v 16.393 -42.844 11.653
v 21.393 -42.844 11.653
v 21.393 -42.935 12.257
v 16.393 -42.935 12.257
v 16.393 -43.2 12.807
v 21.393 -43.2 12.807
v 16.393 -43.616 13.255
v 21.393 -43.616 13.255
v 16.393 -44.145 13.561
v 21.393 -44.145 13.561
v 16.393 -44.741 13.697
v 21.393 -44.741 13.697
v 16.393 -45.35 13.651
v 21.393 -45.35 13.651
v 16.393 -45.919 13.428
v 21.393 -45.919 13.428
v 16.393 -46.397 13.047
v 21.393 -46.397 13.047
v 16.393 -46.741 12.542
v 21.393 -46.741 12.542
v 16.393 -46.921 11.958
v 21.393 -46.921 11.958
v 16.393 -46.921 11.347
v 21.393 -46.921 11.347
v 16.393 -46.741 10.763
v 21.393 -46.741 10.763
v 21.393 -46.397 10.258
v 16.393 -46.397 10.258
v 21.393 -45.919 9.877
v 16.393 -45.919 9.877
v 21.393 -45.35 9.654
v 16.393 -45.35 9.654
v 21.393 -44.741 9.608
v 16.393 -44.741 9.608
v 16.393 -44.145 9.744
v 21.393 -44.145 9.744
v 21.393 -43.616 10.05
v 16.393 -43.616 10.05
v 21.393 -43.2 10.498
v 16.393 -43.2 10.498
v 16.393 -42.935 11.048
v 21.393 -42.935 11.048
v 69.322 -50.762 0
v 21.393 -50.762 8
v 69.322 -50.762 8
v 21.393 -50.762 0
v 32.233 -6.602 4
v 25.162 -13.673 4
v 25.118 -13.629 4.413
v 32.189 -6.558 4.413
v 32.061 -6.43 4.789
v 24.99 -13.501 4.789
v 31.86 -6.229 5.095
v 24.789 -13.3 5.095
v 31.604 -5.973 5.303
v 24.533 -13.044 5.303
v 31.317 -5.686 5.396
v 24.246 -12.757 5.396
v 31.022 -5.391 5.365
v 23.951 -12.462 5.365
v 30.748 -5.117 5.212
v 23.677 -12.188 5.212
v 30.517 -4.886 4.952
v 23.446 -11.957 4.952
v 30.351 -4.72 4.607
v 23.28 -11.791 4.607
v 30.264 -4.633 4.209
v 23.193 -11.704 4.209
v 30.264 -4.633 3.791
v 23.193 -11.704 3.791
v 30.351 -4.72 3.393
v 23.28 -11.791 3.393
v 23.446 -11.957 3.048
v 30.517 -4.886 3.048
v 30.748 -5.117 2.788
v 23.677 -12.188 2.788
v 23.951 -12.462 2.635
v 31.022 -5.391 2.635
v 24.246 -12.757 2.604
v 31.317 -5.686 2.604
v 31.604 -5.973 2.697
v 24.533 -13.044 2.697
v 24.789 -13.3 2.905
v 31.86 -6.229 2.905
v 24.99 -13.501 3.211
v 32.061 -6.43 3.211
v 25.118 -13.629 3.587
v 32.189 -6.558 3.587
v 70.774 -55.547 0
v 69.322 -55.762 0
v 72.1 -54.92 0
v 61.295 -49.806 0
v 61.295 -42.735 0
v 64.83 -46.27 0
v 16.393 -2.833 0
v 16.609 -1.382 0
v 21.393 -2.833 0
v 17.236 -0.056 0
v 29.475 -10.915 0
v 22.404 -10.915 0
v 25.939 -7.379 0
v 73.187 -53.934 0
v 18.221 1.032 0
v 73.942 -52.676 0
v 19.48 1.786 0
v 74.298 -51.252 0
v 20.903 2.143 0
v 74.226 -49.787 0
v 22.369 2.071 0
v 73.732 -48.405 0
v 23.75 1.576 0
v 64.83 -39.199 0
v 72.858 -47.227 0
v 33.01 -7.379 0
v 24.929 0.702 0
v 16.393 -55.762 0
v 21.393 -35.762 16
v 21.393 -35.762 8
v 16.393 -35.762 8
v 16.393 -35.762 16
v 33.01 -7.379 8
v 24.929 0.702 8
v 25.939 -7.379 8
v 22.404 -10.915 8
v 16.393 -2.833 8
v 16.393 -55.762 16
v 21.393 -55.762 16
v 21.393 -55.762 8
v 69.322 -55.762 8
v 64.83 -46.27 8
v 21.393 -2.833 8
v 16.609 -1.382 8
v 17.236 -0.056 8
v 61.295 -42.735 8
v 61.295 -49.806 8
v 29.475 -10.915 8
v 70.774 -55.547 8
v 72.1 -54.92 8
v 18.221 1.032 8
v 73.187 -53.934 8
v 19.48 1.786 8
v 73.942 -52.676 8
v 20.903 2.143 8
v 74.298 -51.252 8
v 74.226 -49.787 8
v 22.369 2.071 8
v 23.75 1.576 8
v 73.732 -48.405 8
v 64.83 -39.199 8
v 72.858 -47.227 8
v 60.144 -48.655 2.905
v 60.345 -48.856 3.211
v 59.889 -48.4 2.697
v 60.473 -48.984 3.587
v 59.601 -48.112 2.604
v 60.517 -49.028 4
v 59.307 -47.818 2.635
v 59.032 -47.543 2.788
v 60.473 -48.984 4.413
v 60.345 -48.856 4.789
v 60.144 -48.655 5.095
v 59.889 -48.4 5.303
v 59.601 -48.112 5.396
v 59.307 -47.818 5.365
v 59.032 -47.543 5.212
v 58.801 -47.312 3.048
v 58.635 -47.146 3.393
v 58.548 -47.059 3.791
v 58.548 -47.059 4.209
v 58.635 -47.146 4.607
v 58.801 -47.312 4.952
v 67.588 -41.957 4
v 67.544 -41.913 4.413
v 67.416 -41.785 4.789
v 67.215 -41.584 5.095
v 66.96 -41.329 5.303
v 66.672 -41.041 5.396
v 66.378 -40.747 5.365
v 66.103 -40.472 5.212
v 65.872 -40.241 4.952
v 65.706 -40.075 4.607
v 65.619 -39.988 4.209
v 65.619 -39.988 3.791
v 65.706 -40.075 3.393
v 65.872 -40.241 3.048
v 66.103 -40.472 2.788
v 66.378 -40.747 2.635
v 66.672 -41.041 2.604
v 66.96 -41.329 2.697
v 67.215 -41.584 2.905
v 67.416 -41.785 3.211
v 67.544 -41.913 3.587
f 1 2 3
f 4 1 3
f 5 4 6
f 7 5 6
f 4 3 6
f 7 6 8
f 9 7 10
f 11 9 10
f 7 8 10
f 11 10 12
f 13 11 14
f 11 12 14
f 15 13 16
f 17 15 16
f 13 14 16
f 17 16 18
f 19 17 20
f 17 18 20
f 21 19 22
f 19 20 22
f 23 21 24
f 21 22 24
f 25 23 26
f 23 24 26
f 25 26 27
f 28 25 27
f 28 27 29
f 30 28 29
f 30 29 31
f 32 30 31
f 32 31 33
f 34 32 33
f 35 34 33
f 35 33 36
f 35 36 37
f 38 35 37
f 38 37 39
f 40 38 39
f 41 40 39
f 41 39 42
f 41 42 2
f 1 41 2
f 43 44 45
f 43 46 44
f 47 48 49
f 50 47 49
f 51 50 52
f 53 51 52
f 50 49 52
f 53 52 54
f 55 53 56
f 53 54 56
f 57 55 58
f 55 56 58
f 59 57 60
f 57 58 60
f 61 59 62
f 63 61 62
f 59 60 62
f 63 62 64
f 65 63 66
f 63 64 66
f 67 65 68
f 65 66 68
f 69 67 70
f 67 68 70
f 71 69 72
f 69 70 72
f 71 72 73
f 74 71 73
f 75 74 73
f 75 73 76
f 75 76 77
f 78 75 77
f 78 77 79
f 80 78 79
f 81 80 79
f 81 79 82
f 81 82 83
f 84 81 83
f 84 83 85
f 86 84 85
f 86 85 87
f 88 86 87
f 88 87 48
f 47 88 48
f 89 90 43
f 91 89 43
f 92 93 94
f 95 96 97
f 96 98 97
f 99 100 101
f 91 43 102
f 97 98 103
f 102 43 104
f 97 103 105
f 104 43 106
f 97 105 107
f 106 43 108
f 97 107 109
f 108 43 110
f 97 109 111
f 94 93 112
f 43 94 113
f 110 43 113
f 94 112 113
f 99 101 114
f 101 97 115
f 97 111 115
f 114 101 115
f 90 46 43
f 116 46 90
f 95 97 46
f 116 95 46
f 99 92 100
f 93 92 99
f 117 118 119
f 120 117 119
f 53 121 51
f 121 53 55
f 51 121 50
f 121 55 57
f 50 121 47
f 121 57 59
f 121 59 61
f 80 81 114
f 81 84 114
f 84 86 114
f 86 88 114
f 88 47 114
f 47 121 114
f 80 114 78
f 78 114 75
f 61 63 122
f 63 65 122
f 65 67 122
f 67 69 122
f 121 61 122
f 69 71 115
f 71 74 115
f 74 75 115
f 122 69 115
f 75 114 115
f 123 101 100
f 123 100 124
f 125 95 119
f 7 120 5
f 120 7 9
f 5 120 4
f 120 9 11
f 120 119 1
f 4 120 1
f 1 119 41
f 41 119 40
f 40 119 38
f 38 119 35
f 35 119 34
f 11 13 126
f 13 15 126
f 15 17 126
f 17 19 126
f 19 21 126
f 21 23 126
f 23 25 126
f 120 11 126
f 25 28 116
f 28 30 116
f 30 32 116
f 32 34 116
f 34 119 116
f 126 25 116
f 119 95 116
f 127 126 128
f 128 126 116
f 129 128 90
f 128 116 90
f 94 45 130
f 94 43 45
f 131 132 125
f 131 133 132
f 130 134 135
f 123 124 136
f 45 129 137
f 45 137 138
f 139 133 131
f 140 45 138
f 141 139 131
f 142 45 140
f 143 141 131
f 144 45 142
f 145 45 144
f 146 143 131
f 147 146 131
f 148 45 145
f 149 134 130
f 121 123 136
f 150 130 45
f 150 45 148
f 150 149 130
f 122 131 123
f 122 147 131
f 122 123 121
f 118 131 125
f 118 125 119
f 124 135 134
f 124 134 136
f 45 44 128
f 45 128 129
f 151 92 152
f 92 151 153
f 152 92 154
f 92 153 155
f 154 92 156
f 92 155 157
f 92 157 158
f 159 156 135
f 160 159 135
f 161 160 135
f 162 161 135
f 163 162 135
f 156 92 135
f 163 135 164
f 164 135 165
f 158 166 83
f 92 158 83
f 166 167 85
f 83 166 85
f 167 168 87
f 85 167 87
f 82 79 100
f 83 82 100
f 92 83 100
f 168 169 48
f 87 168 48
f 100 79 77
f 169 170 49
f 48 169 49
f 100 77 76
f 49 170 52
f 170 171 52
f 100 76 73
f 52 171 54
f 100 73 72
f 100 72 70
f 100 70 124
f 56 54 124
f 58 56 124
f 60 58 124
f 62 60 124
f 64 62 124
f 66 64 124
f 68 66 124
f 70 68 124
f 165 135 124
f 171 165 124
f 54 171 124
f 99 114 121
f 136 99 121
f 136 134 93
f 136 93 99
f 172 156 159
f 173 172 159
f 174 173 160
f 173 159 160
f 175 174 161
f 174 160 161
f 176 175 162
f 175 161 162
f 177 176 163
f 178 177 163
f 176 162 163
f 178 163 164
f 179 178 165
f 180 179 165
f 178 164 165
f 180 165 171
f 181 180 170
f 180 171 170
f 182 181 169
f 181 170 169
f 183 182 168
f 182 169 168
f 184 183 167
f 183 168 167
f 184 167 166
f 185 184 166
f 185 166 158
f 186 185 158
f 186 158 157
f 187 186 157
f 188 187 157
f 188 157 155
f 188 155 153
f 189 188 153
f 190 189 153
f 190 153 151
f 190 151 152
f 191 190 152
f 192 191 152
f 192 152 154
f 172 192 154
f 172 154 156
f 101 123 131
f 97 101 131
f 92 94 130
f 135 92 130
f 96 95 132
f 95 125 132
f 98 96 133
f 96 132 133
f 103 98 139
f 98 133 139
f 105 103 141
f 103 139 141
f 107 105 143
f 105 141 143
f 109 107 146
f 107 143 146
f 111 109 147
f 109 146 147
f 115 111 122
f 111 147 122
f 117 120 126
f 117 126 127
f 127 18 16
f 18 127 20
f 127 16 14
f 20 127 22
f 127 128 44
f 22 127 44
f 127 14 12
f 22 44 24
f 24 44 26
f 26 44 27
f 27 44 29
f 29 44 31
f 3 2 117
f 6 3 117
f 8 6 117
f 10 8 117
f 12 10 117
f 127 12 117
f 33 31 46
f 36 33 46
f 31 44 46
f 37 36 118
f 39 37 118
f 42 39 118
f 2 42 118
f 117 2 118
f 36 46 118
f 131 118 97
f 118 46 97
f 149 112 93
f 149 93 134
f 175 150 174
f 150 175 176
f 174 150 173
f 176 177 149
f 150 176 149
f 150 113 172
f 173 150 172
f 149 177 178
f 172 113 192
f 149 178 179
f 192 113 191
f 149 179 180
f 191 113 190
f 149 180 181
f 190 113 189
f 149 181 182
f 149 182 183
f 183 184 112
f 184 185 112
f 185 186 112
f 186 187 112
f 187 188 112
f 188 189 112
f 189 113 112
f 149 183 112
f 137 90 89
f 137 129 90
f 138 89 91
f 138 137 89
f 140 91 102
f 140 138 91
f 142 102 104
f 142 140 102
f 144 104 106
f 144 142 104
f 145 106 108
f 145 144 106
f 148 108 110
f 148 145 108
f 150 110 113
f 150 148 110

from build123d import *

# Parameters (mm, degrees)
F1_DEPTH = 8
F2_W     = 45
F2_H     = 8
F3_DEPTH = 5
F4_T     = -5
F5_D     = 2.8
F5_DEPTH = 11
F5_TIP   = 0.8412048666
F7_DEPTH = 8
F9_D     = 4.1
F9_DEPTH = 7
F9_TIP   = 1.231764269
F10_R    = 5


with BuildPart() as f1:
    # F0 (on Top) → F1 (new body)
    with BuildSketch(Plane.XY):
        Polygon((81.39341741, -55.7623273981), (16.39341741, 9.2376726019), (16.39341741, -55.7623273981), align=None)
    extrude(amount=F1_DEPTH)

    # F2 (on face) → F3 (cut)
    with BuildSketch(Plane(origin=(12.8155450059, 12.8155450059, 0), x_dir=(-0.7071067812, 0.7071067812, 0), z_dir=(0.7071067812, 0.7071067812, 0))):
        with Locations((-51.0598756783, 4)):
            Rectangle(F2_W, F2_H)
    extrude(amount=-F3_DEPTH, mode=Mode.SUBTRACT)

    # F4
    f4_openings = [f1.faces().sort_by_distance(p)[0] for p in [
        (36.976212, -35.173116, 8),
        (36.976212, -35.173116, 0),
    ]]
    offset(amount=F4_T, openings=f4_openings, kind=Kind.INTERSECTION)

    # F5
    with Locations(Plane(origin=(12.8155450059, 12.8155450059, 0), x_dir=(-0.7071067812, 0.7071067812, 0), z_dir=(0.7071067812, 0.7071067812, 0))):
        with Locations((-26.0598756783, 4), (-76.0598756783, 4)):
            Hole(F5_D / 2, depth=F5_DEPTH)
            with Locations((0, 0, -(F5_DEPTH + F5_TIP / 2))):  # 118° drill point
                Cone(0, F5_D / 2, F5_TIP, mode=Mode.SUBTRACT)

    # F6 (on face) → F7 (join)
    with BuildSketch(Plane.XY.offset(8)):
        Polygon((21.39341741, -35.7623273981), (16.39341741, -35.7623273981), (16.39341741, -55.7623273981), (21.39341741, -55.7623273981), (21.39341741, -50.7623273981), align=None)
    extrude(amount=F7_DEPTH)

    # F9
    with Locations(Plane(origin=(16.39341741, 0, 0), x_dir=(0, -1, 0), z_dir=(-1, 0, 0))):
        with Locations((44.8939013033, 11.6526295621)):
            Hole(F9_D / 2, depth=F9_DEPTH)
            with Locations((0, 0, -(F9_DEPTH + F9_TIP / 2))):  # 118° drill point
                Cone(0, F9_D / 2, F9_TIP, mode=Mode.SUBTRACT)

    # F10
    f10_edges = [f1.edges().sort_by_distance(p)[0] for p in [
        (16.393417, 9.237673, 4),
        (81.393417, -55.762327, 4),
    ]]
    fillet(f10_edges, radius=F10_R)


solid = f1.part
